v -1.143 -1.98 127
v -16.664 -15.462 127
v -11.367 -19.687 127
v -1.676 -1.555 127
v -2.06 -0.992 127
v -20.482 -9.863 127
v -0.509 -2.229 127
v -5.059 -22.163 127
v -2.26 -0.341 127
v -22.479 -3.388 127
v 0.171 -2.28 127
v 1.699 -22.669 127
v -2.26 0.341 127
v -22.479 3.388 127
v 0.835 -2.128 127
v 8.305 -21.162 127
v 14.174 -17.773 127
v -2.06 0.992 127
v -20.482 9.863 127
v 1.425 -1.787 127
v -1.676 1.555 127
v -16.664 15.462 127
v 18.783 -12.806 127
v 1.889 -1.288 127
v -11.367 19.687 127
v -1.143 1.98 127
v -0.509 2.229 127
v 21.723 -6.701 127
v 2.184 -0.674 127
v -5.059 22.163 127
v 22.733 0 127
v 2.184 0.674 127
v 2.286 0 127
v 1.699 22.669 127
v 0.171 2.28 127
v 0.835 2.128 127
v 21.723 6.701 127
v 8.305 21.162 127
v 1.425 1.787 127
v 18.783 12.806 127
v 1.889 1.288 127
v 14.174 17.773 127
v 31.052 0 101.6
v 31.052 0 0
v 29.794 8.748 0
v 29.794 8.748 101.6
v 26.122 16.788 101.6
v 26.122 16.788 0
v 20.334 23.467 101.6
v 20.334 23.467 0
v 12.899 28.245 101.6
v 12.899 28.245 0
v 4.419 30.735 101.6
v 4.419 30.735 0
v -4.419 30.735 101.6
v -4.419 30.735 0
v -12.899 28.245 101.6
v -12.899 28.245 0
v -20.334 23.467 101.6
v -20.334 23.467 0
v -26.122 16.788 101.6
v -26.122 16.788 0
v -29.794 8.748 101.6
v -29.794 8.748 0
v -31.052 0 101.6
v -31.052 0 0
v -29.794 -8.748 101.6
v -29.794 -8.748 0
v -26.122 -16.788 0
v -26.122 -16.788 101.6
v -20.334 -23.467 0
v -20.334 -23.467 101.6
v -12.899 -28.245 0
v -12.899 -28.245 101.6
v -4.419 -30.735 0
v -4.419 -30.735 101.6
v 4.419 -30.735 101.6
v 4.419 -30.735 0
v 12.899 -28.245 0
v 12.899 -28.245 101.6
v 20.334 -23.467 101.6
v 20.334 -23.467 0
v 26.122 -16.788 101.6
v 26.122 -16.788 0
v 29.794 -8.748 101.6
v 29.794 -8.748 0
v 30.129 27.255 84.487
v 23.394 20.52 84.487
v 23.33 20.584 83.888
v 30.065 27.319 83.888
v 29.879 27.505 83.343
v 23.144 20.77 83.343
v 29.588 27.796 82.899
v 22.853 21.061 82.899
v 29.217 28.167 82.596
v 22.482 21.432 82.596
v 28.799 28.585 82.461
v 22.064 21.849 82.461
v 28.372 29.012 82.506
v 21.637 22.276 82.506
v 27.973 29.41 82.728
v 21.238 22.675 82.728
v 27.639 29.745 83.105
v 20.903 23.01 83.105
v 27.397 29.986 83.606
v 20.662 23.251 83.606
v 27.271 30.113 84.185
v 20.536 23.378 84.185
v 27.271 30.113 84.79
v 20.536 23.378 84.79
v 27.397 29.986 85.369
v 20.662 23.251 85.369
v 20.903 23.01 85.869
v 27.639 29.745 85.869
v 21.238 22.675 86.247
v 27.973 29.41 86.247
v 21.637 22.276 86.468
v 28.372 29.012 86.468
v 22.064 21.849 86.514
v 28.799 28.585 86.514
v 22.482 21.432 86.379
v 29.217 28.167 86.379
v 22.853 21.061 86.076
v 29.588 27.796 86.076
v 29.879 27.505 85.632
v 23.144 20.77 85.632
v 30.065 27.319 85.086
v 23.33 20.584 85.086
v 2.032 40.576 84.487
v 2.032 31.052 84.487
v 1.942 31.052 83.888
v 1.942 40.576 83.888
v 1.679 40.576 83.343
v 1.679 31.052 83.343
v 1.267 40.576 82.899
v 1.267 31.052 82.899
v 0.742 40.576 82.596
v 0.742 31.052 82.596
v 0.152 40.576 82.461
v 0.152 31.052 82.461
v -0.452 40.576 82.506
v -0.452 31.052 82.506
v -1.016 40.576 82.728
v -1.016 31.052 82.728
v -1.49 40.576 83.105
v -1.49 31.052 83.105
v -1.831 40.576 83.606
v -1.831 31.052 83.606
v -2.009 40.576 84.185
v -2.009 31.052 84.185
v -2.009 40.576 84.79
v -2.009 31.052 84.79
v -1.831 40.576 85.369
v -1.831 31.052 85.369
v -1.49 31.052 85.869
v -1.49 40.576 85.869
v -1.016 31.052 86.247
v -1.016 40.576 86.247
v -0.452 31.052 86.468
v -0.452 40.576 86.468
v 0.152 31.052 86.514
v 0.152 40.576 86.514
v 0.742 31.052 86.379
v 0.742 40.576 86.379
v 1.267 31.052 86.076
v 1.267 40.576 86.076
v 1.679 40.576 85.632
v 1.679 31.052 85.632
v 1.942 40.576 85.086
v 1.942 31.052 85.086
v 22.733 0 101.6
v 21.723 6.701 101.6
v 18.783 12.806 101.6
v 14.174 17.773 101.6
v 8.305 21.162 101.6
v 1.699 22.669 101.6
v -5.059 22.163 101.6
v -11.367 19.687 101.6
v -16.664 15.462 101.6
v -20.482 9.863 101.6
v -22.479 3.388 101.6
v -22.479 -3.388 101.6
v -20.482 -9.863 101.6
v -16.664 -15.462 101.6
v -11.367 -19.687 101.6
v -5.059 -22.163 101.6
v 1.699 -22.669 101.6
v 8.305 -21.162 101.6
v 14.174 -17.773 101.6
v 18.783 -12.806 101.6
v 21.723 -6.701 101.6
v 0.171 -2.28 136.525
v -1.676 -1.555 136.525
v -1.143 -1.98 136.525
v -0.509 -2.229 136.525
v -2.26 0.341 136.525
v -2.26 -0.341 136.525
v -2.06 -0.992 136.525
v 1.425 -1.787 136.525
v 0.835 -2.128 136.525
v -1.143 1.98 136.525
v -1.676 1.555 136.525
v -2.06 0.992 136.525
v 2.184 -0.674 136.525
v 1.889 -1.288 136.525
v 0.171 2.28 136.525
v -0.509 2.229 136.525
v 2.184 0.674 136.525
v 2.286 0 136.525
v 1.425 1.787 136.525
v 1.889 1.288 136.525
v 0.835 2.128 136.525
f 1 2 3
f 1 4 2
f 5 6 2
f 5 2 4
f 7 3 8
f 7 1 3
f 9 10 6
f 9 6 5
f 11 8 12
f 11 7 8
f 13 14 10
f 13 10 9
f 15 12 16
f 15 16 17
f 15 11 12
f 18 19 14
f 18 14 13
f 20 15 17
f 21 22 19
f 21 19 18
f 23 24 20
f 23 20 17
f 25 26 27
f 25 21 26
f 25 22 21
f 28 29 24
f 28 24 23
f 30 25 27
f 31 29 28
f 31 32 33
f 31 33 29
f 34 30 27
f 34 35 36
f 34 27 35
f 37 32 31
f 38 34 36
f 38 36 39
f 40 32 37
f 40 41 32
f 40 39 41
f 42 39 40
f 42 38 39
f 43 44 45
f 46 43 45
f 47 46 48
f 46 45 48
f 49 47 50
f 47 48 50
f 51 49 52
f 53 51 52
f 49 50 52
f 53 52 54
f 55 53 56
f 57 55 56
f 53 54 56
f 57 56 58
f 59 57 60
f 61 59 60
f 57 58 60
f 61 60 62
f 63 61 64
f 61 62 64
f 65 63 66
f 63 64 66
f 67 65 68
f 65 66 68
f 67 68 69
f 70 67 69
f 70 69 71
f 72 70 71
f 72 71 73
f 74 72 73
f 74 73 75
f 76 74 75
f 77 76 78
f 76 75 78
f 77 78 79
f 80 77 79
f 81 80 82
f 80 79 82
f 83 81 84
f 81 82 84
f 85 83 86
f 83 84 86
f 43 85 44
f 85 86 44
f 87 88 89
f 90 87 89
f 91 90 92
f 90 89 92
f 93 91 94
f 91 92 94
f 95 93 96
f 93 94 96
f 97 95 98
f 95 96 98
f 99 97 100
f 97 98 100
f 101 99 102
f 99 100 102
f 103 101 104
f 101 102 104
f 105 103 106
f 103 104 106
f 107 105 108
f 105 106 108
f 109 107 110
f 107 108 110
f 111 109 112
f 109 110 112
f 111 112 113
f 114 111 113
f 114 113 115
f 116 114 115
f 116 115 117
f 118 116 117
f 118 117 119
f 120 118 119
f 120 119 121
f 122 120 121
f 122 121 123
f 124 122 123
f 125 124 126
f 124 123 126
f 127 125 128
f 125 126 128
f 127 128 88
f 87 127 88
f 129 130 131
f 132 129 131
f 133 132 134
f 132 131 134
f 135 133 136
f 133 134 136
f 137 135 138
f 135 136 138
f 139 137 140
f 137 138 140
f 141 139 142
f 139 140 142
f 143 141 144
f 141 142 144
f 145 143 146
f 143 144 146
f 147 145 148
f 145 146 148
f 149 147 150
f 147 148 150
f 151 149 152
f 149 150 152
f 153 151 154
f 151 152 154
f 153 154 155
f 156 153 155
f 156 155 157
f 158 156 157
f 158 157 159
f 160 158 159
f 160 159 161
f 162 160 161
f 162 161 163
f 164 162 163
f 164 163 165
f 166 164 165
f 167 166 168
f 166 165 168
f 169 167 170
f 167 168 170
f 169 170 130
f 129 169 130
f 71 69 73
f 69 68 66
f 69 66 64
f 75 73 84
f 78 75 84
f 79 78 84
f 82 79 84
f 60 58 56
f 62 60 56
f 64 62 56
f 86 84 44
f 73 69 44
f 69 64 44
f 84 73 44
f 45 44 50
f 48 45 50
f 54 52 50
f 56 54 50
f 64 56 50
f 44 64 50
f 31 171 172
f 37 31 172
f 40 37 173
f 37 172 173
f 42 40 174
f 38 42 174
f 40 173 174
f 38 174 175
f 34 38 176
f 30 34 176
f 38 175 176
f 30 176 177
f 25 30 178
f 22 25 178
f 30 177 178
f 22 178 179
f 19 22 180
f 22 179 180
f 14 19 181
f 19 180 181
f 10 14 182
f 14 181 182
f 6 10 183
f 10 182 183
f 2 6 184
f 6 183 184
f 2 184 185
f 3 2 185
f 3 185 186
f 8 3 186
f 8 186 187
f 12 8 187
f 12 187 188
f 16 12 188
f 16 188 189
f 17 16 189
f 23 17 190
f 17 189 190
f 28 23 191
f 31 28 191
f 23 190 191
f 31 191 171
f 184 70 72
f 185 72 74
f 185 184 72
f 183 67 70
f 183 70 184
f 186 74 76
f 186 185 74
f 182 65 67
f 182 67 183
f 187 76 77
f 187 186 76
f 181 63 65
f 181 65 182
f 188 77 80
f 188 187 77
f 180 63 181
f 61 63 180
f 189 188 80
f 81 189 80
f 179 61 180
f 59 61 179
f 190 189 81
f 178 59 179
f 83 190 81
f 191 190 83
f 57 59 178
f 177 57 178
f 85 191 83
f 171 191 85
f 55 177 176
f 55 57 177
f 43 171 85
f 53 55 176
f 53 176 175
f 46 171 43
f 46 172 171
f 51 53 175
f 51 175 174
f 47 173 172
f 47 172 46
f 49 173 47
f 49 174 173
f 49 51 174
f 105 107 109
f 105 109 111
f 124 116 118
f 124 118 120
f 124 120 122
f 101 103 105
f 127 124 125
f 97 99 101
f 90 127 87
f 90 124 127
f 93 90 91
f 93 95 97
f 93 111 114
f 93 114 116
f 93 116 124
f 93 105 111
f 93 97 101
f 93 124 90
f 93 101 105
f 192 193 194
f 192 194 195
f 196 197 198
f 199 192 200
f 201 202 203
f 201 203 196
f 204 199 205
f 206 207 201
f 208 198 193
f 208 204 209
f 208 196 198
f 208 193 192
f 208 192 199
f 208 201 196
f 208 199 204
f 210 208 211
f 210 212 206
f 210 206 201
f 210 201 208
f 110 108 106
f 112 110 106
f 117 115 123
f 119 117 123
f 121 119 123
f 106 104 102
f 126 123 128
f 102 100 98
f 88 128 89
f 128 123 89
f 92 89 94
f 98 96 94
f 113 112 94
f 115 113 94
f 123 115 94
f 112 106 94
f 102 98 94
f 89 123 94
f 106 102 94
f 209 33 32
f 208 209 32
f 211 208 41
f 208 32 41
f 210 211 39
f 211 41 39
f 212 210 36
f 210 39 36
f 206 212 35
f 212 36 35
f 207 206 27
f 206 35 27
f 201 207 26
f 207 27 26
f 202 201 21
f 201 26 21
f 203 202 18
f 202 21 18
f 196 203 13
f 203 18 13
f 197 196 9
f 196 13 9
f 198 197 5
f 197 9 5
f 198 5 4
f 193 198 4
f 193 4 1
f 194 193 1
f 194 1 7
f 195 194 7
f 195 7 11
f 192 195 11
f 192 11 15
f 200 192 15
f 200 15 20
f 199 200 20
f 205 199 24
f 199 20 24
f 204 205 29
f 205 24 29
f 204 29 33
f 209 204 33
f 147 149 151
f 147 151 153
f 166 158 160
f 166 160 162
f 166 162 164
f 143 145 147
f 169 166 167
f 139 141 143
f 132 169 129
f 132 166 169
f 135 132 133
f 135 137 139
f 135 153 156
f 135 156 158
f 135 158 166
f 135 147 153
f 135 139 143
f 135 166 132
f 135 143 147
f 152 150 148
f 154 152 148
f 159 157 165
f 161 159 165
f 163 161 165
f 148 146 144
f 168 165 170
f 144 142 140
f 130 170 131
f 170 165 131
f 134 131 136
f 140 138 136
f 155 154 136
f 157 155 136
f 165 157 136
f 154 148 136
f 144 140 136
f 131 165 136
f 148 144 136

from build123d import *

# Parameters (mm, degrees)
SKETCH1_R           = 31.0515
BOSS_EXTRUDE1_DEPTH = 101.6
SKETCH2_R           = 22.733
BOSS_EXTRUDE2_DEPTH = 25.4
SKETCH3_R           = 2.286
BOSS_EXTRUDE3_DEPTH = 9.525
SKETCH4_R           = 2.032
BOSS_EXTRUDE4_DEPTH = 9.525
CIRPATTERN3_COUNT   = 2
CIRPATTERN3_ANGLE   = 45


with BuildPart() as part:
    # Sketch1 → Boss-Extrude1 (new body)
    with BuildSketch(Plane.XY):
        Circle(SKETCH1_R)
    extrude(amount=BOSS_EXTRUDE1_DEPTH)

    # Sketch2 → Boss-Extrude2 (add)
    with BuildSketch(Plane.XY.offset(101.6)):
        Circle(SKETCH2_R)
    extrude(amount=BOSS_EXTRUDE2_DEPTH)

    # Sketch3 → Boss-Extrude3 (add)
    with BuildSketch(Plane.XY.offset(127)):
        Circle(SKETCH3_R)
    extrude(amount=BOSS_EXTRUDE3_DEPTH)


with BuildPart() as body_2:
    # Sketch4 → Boss-Extrude4 (new body)
    with BuildSketch(Plane(origin=(0, 31.0515, 0), x_dir=(1, 0, 0), z_dir=(0, 1, 0))):
        with Locations((0, -84.487378835)):
            Circle(SKETCH4_R)
    extrude(amount=BOSS_EXTRUDE4_DEPTH)


with BuildPart() as cirpattern3_1:
    # CirPattern3: pattern copy
    add(body_2.part.rotate(Axis((0, 0, 143.35125), (0, 0, -1)), 1 * CIRPATTERN3_ANGLE / (CIRPATTERN3_COUNT - 1)))


solid = Compound([part.part, body_2.part, cirpattern3_1.part])
